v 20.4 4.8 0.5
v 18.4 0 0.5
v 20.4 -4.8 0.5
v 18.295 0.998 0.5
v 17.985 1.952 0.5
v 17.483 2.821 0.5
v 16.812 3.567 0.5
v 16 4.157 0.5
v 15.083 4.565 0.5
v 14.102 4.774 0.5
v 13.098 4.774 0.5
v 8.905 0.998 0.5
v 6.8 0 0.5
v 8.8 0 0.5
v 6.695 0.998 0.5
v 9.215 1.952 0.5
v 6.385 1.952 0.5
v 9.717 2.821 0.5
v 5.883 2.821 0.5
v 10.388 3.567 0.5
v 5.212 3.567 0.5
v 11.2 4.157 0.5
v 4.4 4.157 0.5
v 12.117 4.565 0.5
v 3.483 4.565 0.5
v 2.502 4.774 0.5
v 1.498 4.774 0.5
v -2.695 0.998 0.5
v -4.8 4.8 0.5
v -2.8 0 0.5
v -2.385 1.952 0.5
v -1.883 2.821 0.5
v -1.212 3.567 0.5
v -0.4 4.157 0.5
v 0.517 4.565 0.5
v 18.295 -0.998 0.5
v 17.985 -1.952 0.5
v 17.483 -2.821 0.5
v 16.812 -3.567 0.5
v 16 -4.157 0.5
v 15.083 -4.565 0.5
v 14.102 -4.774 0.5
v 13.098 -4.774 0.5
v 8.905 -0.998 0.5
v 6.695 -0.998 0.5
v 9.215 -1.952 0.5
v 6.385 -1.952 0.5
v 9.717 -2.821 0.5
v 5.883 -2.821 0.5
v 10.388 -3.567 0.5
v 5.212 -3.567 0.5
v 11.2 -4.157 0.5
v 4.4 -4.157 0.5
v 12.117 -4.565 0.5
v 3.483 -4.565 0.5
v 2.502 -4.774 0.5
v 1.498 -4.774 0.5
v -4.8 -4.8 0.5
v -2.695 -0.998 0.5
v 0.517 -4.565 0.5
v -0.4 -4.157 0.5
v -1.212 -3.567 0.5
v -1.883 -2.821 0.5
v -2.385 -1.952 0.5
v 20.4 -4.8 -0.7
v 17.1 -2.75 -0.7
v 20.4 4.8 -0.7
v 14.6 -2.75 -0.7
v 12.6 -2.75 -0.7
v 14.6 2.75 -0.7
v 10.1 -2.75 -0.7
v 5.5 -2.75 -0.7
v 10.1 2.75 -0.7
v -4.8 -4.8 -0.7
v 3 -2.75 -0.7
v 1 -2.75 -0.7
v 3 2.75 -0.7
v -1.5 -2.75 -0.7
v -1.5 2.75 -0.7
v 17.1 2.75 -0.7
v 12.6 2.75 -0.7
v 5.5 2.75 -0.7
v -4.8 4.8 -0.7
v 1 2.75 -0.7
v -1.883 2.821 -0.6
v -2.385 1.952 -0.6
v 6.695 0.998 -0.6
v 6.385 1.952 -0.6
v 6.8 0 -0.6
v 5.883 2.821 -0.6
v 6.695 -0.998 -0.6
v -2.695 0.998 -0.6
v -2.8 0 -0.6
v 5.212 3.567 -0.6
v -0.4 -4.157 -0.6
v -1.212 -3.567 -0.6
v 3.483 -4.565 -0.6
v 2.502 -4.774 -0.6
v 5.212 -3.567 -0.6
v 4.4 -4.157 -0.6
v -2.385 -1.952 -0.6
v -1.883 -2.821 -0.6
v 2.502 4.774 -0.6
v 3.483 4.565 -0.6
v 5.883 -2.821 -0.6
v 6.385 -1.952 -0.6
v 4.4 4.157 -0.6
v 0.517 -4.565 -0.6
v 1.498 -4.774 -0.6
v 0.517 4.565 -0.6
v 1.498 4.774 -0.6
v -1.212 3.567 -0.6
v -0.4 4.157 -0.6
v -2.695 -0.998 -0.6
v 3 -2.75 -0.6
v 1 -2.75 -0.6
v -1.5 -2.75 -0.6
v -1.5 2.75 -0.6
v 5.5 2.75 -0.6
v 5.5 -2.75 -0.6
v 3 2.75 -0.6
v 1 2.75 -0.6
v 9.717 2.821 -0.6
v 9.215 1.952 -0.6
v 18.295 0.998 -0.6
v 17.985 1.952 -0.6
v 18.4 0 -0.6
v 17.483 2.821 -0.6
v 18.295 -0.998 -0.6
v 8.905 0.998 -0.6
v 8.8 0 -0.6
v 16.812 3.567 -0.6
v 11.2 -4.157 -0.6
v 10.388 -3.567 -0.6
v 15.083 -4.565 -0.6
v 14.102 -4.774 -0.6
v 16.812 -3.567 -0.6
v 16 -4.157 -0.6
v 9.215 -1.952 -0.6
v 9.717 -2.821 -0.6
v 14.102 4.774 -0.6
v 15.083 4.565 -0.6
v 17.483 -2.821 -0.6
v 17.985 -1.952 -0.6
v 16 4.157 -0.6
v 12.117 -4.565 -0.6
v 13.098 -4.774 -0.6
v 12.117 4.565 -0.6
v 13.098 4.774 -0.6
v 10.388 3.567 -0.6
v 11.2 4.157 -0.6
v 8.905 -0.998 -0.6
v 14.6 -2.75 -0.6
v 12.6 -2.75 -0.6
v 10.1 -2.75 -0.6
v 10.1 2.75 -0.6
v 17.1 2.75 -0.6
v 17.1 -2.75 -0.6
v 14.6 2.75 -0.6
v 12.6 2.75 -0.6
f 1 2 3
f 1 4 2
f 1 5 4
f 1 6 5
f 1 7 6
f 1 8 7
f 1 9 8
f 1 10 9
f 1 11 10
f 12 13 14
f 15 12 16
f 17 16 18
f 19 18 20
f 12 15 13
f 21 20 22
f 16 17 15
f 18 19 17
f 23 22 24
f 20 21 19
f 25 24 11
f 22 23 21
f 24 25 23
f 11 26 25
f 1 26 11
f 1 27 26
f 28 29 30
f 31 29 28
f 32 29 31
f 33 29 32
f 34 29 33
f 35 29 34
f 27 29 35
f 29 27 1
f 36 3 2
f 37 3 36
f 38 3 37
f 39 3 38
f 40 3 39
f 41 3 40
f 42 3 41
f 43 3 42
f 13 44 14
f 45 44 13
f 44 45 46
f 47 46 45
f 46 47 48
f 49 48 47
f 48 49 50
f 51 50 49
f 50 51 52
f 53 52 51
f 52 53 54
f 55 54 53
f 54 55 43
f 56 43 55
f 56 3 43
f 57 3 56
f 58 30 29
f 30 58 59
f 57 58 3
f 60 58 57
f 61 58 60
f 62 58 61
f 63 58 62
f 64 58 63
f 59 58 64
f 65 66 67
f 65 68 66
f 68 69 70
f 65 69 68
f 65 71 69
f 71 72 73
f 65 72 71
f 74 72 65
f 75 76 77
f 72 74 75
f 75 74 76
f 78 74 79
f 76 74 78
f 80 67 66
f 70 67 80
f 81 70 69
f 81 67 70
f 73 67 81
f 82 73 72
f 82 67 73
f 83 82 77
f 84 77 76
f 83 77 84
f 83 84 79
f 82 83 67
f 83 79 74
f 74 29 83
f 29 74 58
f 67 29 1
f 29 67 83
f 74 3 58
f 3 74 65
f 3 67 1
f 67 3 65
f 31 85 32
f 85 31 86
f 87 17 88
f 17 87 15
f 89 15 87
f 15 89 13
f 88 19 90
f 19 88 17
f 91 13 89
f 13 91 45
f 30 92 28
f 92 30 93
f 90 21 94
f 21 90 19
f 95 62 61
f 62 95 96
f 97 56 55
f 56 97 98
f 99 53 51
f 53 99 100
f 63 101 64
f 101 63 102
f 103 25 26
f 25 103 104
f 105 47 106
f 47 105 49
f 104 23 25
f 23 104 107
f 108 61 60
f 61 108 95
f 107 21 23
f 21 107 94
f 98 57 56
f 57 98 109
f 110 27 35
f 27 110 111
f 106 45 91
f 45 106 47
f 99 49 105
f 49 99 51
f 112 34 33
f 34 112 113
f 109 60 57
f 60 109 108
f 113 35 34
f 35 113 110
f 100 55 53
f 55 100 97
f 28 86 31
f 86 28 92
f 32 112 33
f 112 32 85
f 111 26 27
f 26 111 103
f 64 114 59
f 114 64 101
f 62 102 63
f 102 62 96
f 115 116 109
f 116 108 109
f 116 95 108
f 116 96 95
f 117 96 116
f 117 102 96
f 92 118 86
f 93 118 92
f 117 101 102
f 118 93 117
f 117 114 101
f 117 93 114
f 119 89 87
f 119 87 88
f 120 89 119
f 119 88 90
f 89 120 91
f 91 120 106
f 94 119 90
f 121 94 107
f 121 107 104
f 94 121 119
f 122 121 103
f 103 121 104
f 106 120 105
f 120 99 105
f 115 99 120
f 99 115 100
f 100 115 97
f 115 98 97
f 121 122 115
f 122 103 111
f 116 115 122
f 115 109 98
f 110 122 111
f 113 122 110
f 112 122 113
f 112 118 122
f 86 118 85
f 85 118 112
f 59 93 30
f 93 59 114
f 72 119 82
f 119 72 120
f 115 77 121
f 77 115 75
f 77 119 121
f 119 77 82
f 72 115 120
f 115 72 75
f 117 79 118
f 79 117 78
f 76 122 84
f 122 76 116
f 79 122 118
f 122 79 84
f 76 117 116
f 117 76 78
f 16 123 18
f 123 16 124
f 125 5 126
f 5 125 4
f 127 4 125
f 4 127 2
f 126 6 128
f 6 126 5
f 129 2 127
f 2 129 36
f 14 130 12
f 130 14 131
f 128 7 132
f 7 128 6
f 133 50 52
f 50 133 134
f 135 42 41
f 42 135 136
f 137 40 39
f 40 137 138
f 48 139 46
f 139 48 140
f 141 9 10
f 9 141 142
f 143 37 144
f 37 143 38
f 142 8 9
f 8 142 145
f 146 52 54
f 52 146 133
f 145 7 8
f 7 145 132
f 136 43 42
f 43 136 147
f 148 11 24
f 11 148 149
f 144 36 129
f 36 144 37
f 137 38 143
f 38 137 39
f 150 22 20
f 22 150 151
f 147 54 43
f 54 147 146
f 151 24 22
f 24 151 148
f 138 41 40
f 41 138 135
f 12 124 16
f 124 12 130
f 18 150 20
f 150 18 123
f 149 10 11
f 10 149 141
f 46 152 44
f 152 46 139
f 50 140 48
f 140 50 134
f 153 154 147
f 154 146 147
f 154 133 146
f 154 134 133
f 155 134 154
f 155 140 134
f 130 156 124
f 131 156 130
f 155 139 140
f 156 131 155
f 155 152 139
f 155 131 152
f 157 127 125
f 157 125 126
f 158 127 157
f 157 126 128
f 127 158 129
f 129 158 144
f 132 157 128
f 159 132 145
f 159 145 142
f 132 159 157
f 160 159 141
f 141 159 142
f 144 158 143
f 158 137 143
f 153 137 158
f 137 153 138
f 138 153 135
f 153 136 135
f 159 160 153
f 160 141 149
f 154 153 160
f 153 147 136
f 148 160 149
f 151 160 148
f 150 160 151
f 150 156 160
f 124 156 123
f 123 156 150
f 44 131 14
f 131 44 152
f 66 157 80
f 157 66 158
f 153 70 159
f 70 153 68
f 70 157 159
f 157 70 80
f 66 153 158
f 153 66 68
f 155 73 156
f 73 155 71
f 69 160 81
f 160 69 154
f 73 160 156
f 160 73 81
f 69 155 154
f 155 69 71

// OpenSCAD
///< Alitovo Neo pixel RGB X000UCVKBH 2812b-1-LED-WH


///< Parameters - Begin
led_assembly_h = 2.8;
led_assembly_d = 9.6;

///< Diameter of the PCB 
pcb_d = 9.6;
pcb_h = 1.2;

///< Demensions of the LED IC
led_w = 5;
led_d = led_w;
led_h = led_assembly_h - pcb_h;

solder_pad_w = 2.5;
solder_pad_d = 1.5;
solder_pad_h = 2;

include_solder_pads = true;
use_hulled_pads     = true;

///< Modules
module pcb(h = pcb_h, d = pcb_d){
     ///< LED PCB definition
     ///< The h/d parameters are passed in to
     ///< allow for socketing of the LEDs.
    color( "white" )cylinder( h=h, d=d, center = true, $fn = 30 );
}

module led(){
     ///< Neo pixel LED (2812b-1)
     union(){
         color( "silver" )cube( [ led_w, led_d, led_h ], center = true );
         color( "lime" )
             cylinder( h=led_h, d= led_w, center = true, $fn = 30 );
         }
}

module solder_pad(){
    cube( [ solder_pad_w, solder_pad_d, solder_pad_h ], center = true );
}

module solder_pads(){
     translate([1+solder_pad_w/2,0,-solder_pad_h/2])
         solder_pad();
     translate([1+solder_pad_w/2,2,-solder_pad_h/2])
         solder_pad();
     translate([1+solder_pad_w/2,-2,-solder_pad_h/2])
         solder_pad();
}

module solder_pads_mirrored(){
     solder_pads();
     mirror([1,0,0])
         solder_pads();
}

module hulled_pads(){
    hull(){
        solder_pads();
    }
}

module hulled_pads_mirrored(){
    hulled_pads();
     mirror([1,0,0])
         hulled_pads();
}

module neo_pixel(h=pcb_h, d=pcb_d ){
     ///< Assembly of the led and pcb_pad
     union(){
         translate([0,0,h-0.01])led();
          pcb(h=h, d=d);
          }
     if( include_solder_pads ){
         solder_pads_mirrored();
         if( use_hulled_pads ){
             hulled_pads_mirrored();
         } else {
             solder_pads_mirrored();
         }
     }
}

module pixel_clip_v1(lead_d = 1, foot_t = 2){
    width = pcb_d/2+pcb_d/2+led_w;
    zmag  = (led_h+lead_d/2);
    module retainer_qrt(){
        translate([pcb_d/2,0,0])
            cube( [ pcb_d/2, pcb_d,led_h ], center=true );
        translate([-pcb_d/2,0,0])
            cube( [pcb_d/2, pcb_d, led_h ], center=true );
    }
    translate([0,0,pcb_h])
        retainer_qrt();
    translate([0,0,-zmag ])
        retainer_qrt();

    translate([-width/2,-pcb_d/2-foot_t/2,-zmag-led_h/2 ])
        color("red")cube([width, foot_t, led_h+lead_d/2+led_h+pcb_h]);
}

module neoclip( lead_d = 1, rot = 0, foot_h = 1, tol = 0.25 ){
    post_dim = [led_h-0.1, pcb_d/2, pcb_d];
    
    module retainer_post(){
        translate([pcb_h,pcb_d/2+tol,0])
            cube( post_dim, center=true);   
    }
    module z_axis_pixel(){
    rotate_about_pt( rot , 90, [0,0,0])
        neo_pixel();
    }
    module front_post(){
        retainer_post();
        mirror([0,1,0])
            retainer_post();
    }
    module back_post(){
        //cube([ led_h-0.1, pcb_d+led_w+tol, pcb_d ],center=true);
        cube([ led_h-0.1, pcb_d, pcb_d ],center=true);
    }

    module foot(){
        x=pcb_h*2+lead_d+led_h-0.1;
        y=pcb_d+led_w+tol;
        color("pink")
            translate([-lead_d/2,0,-foot_h/2])
            cube([ x, y, foot_h ],center=true);
    }

    module three_posts(include_foot=true){
            front_post();
            translate([-pcb_h-lead_d,0,0])
                back_post();
            if( include_foot ){
                translate([0,0,-pcb_d/2])
                    foot();
            }
    }
    
    difference(){
        rotate([0,0,rot]){
            three_posts();
        }
        #z_axis_pixel();
    }
}

module pixel_iter( num_pixels = 1, lpad = 2, rpad = 0, z_offset = 0.9 ){
    //< PCBs
    for( i = [ 0 : num_pixels-1 ] ){
        x = lpad+(i * pcb_d)+(i * rpad)+(i * lpad);
        translate([x, 0, 0 ])
            neo_pixel();
    }
}

module cube_iter( num_cubes = 1, lpad = 2, rpad = 0, z_offset = 0.1, dir = 1) {
    //< Sled 
    for( i = [ 0 : num_cubes-1 ] ){
        x = lpad+(i * pcb_d)+(i * rpad)+(i * lpad);
        cube_w = pcb_d;
        cube_d = pcb_d;
        cube_h = pcb_h;
        translate([ -cube_w/2, -cube_d/2, ((-pcb_h/2)-z_offset)*dir ] )
            color("lime")cube([x+pcb_d, pcb_d, pcb_h], false );
    }
}

module pixel_sled_bottom(num_pixels = 1, lpad = 2, rpad = 1, z_offset = 0.1){
        cube_iter( num_pixels,  lpad, rpad, z_offset, dir = 1 );
}

module pixel_sled_top( num_pixels = 1, lpad = 2, rpad = 1, z_offset = 0.1 ){
        cube_iter( num_pixels,  lpad, rpad, z_offset, dir = -1 );
}

module pixel_strip(){
    difference(){
        union(){
            pixel_sled_bottom(2, lpad = 2, rpad = 2);
            //translate([0.5,0,0] ) pixel_sled_top(2, lpad = 2, rpad=1);
        }
        pixel_iter( 2 );
    }
}

///< Build object
///< Remove this when including
//neoclip();

//neo_pixel();

pixel_strip();
